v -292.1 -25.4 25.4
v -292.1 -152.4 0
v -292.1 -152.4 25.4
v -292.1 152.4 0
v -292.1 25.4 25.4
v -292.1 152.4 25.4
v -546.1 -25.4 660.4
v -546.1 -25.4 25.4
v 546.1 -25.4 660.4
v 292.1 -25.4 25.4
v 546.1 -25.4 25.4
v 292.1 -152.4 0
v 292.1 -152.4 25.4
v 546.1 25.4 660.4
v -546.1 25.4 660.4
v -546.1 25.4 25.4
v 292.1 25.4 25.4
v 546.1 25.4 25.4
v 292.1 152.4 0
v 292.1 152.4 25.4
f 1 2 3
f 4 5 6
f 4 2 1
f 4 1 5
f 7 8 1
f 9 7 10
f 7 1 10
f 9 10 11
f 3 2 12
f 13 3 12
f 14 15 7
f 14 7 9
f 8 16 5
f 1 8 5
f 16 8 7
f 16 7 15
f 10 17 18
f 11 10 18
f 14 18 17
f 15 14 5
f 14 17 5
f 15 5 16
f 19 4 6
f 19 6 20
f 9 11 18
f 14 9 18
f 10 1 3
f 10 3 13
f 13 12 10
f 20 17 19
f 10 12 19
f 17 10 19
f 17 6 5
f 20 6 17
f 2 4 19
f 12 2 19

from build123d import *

# Parameters (mm, degrees)
F0_W     = 584.2
F0_H     = 304.8
F1_DEPTH = 25.4
F2_W     = 254
F2_H     = 50.8
F2_W_2   = 584.2
F3_DEPTH = 635


with BuildPart() as f1:
    # F0 (on Top) → F1 (new body)
    with BuildSketch(Plane.XY):
        Rectangle(F0_W, F0_H)
    extrude(amount=F1_DEPTH)

    # F2 (on face) → F3 (join)
    with BuildSketch(Plane.XY.offset(25.4)):
        with Locations((-419.1, 0)):
            Rectangle(F2_W, F2_H)
        Rectangle(F2_W_2, F2_H)
        with Locations((419.1, 0)):
            Rectangle(F2_W, F2_H)
    extrude(amount=F3_DEPTH)


solid = f1.part
